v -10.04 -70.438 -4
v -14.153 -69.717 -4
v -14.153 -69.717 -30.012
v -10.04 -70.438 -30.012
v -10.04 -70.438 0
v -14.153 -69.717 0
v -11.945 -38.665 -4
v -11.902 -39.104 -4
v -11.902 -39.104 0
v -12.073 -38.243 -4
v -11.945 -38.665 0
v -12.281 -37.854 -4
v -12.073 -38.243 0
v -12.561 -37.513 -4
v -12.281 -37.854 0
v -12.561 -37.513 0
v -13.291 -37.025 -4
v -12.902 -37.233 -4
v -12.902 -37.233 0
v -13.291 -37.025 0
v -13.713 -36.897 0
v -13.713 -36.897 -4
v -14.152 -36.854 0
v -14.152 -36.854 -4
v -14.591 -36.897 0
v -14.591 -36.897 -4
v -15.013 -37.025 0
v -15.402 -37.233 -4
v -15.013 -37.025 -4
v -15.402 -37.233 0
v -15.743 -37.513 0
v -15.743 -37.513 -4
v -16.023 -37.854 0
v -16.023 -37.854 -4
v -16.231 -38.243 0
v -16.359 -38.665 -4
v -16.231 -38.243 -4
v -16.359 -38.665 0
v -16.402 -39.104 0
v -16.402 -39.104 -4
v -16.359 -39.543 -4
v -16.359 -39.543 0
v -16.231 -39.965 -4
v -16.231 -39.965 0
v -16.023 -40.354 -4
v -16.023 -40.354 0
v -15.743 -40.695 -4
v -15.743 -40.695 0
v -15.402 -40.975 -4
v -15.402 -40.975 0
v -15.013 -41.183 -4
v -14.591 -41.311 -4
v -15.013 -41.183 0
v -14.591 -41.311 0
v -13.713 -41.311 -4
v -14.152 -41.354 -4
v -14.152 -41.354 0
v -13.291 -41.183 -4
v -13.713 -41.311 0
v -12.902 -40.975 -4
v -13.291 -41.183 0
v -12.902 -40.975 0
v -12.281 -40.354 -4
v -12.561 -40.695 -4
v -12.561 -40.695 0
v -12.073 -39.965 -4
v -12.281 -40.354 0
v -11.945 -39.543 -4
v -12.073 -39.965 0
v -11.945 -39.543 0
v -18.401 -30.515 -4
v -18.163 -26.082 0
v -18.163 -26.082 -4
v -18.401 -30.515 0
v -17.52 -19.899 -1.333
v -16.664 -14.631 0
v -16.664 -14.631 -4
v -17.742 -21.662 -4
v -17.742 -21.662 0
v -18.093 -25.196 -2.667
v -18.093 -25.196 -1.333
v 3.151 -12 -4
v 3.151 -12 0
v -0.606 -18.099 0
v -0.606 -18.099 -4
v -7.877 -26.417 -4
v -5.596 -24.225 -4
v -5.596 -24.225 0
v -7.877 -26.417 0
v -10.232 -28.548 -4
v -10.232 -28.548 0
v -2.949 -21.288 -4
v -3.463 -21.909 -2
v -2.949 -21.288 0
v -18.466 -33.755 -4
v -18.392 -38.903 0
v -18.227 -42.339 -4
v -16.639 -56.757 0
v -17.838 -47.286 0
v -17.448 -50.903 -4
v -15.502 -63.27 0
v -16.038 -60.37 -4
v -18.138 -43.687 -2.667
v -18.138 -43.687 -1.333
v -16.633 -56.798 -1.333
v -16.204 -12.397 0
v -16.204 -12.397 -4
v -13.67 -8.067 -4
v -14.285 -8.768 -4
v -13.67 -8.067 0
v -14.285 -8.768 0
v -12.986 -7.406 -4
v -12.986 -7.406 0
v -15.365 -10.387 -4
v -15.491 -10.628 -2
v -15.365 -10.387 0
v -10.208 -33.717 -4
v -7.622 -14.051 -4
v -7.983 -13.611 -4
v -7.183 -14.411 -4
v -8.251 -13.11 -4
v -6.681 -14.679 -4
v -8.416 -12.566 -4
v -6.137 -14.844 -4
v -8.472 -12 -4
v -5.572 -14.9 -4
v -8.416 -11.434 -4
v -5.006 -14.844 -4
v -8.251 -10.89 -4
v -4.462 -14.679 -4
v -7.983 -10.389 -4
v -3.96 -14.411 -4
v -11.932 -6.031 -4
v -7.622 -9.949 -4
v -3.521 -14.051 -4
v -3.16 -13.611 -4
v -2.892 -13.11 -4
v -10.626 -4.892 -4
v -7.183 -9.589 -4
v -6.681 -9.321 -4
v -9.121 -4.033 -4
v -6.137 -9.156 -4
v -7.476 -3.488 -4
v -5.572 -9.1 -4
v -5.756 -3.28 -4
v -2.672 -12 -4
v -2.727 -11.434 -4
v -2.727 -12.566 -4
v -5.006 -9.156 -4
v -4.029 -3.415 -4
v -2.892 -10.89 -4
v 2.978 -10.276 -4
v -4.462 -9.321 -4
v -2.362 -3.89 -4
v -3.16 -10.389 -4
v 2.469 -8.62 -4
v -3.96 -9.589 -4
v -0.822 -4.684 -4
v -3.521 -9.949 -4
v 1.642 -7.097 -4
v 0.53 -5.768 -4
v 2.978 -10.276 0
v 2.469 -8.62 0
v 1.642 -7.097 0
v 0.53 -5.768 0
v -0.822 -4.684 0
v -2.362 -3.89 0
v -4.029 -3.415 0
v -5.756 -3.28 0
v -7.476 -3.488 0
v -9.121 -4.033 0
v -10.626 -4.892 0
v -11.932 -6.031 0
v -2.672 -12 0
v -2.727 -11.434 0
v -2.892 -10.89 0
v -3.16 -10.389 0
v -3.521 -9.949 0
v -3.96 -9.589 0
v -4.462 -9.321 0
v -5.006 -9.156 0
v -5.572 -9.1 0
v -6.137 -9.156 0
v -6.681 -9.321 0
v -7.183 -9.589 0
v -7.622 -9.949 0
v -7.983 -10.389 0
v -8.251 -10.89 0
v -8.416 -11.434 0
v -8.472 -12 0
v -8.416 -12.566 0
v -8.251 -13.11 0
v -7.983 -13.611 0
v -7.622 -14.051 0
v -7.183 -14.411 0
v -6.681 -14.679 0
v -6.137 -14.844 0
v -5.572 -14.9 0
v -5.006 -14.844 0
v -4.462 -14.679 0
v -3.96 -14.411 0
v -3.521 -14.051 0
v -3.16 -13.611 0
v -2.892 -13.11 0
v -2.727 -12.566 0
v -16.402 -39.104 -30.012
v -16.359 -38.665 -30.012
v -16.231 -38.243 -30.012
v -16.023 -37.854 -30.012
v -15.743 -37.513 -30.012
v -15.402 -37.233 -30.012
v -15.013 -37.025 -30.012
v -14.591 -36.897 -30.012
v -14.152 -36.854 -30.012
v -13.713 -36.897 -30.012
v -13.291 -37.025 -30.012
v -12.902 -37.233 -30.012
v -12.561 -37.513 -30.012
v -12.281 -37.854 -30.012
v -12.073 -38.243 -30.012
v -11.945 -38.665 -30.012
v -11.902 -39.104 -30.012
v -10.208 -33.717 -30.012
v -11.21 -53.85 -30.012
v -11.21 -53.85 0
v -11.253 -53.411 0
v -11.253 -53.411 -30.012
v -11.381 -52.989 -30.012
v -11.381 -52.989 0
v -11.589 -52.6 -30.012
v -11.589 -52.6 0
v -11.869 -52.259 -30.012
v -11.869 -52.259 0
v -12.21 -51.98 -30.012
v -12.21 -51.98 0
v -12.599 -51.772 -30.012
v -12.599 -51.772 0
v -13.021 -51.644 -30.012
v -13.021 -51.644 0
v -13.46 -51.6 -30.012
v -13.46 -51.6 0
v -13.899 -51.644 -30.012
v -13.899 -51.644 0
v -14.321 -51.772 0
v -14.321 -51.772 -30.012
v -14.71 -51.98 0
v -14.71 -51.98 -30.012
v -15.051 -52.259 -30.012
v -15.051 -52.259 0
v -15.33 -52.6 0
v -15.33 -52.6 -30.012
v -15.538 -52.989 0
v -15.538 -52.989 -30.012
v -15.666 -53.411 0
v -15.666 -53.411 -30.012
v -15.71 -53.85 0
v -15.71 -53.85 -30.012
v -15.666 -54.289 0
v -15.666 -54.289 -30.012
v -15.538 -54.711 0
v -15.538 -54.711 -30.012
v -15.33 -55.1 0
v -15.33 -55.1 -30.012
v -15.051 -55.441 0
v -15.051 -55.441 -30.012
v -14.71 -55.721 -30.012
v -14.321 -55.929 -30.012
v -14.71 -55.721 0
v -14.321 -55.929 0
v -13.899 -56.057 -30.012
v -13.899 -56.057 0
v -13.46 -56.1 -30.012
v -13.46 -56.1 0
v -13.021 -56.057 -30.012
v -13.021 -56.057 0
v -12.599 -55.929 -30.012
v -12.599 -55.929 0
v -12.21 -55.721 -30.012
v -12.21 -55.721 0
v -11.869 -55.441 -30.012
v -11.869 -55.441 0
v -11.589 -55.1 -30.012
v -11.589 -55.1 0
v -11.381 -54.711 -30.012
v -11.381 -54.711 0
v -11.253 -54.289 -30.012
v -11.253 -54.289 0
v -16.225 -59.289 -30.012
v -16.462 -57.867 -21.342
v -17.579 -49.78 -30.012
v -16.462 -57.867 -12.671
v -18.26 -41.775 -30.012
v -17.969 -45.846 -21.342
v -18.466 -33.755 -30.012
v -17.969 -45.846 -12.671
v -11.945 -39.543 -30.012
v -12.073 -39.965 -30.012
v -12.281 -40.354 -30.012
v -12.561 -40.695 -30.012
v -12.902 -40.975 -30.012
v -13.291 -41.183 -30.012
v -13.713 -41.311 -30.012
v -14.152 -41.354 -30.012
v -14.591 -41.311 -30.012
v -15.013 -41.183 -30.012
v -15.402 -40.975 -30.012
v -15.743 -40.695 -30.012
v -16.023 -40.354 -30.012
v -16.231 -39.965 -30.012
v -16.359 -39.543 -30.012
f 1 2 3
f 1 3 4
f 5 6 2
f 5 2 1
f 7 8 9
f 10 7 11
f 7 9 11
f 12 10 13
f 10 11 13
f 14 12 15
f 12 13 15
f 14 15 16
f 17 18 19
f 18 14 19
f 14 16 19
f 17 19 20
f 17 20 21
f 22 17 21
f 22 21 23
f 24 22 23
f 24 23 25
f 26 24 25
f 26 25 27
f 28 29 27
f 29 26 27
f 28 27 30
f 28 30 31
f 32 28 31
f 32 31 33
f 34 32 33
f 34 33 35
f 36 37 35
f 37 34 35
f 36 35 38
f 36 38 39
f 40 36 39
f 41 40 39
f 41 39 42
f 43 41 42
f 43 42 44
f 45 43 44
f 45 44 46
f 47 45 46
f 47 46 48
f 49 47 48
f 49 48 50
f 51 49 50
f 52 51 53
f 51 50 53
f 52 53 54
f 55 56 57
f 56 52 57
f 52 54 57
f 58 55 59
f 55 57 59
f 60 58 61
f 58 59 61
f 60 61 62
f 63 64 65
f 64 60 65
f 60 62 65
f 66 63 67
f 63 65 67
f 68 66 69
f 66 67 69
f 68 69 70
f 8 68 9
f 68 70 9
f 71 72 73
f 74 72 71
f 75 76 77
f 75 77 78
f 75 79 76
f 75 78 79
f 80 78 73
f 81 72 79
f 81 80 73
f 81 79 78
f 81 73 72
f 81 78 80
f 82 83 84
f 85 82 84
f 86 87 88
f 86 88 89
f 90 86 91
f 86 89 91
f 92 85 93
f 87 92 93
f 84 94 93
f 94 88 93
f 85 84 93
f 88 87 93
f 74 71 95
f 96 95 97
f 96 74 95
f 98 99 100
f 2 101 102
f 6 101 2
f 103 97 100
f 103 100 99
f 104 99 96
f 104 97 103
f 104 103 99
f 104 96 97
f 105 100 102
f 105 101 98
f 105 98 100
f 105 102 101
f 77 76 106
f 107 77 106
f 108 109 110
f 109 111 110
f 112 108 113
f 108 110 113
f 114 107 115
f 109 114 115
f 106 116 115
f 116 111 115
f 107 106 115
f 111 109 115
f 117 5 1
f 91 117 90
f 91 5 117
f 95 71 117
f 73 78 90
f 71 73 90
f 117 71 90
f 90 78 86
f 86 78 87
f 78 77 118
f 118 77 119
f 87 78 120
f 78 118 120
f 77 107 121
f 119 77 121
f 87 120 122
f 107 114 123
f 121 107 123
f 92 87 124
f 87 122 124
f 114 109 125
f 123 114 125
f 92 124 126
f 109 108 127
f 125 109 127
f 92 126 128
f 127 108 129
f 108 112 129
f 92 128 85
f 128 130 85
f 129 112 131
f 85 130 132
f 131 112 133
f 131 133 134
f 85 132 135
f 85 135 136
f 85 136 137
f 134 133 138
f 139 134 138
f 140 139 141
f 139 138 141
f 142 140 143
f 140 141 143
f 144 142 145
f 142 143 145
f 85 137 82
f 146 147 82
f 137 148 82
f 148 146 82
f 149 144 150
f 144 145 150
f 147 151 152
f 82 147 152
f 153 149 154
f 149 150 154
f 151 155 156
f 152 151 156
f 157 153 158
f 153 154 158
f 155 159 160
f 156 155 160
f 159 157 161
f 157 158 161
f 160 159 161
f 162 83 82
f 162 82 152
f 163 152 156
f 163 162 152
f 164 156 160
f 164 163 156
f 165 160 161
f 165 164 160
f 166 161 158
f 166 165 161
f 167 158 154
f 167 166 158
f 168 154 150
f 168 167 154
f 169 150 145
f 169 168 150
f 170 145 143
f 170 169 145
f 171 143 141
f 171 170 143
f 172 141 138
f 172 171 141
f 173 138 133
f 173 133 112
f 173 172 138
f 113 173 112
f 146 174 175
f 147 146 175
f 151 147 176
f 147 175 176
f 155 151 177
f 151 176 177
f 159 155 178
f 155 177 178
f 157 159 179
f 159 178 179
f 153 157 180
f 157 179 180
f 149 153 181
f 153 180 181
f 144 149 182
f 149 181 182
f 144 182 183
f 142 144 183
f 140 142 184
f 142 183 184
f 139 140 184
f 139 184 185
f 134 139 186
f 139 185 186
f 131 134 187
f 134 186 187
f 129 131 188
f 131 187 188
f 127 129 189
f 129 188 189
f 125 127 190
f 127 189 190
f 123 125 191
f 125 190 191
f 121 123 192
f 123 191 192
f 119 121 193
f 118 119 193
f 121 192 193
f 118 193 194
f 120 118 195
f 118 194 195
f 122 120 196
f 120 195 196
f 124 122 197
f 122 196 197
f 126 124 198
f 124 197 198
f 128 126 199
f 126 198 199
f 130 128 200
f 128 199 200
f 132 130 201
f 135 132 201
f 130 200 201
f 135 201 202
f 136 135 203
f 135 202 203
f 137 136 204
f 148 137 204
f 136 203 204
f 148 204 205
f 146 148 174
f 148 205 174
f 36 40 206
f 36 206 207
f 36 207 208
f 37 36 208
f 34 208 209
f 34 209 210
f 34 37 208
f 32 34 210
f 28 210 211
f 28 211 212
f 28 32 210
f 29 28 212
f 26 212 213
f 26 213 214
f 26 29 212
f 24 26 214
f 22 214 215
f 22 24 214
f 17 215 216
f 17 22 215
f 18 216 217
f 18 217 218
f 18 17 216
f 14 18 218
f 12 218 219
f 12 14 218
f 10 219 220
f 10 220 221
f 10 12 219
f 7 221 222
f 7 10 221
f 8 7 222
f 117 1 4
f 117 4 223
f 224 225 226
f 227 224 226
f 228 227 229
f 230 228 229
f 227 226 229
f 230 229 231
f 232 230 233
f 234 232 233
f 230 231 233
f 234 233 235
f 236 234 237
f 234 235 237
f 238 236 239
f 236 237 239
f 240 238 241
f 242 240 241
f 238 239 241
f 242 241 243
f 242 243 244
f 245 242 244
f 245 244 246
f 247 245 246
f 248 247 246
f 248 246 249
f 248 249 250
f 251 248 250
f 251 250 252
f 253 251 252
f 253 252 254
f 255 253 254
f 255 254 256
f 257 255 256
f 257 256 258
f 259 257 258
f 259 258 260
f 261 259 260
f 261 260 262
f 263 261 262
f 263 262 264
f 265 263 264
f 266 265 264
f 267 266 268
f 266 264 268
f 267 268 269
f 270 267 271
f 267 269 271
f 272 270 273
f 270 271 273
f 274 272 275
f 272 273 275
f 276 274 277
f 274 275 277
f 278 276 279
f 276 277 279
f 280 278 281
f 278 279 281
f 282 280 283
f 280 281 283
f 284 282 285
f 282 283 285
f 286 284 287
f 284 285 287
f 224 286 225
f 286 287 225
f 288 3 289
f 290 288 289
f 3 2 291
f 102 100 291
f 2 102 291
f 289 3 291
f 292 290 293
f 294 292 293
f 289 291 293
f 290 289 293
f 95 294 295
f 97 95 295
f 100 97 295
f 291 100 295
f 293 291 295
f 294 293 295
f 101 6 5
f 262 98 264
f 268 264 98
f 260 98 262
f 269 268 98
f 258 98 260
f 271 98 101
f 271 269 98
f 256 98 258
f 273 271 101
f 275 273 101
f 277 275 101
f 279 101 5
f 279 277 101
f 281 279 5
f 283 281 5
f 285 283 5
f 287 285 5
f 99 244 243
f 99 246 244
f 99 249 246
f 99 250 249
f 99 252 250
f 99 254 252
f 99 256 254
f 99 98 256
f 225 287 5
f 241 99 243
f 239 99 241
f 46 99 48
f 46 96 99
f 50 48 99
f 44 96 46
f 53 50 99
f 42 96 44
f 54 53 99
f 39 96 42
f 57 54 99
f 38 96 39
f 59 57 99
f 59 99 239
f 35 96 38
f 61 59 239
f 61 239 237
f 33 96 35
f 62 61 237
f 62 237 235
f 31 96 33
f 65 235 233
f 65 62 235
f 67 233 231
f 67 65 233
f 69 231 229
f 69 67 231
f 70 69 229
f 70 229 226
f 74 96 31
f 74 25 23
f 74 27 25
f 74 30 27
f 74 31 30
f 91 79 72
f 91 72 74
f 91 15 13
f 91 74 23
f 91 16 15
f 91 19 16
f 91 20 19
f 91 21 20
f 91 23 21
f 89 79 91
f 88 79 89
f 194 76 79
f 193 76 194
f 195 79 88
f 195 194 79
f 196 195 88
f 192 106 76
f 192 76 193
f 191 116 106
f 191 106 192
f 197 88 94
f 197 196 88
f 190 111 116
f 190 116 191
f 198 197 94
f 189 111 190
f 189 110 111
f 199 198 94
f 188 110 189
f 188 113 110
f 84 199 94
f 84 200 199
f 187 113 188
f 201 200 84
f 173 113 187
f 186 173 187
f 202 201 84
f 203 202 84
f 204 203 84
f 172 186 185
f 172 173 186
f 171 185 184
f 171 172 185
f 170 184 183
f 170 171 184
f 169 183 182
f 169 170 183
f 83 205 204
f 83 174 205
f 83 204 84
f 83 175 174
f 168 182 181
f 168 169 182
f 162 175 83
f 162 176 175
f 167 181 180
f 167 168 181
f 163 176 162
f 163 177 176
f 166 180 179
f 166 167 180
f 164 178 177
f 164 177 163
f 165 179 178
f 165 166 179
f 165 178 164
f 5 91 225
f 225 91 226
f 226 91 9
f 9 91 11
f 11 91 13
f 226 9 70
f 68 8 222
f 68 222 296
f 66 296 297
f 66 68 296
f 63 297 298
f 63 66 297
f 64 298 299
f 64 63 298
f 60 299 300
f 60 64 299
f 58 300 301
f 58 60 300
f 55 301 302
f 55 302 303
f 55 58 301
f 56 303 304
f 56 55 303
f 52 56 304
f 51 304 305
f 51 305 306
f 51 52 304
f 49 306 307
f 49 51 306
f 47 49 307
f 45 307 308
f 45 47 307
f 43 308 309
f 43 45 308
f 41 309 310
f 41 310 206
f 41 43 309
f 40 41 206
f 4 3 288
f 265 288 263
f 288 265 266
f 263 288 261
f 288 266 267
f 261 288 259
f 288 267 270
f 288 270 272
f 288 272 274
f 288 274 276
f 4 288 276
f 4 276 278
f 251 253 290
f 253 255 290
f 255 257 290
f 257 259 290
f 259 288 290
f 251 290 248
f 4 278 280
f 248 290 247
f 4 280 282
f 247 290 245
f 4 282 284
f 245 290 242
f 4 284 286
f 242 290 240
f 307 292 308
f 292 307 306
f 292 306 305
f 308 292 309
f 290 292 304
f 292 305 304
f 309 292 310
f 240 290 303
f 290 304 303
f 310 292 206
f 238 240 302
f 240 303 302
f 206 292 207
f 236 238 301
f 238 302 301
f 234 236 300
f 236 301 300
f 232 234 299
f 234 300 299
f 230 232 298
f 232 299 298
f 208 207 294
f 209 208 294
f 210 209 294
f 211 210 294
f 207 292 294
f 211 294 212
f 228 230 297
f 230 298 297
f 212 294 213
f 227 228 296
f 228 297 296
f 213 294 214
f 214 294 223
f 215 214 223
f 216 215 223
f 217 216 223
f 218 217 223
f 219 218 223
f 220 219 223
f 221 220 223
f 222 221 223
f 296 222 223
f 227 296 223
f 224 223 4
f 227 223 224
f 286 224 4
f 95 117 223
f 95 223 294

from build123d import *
from build123d.topology import SkipClean

# Parameters (mm, degrees)
SKETCH1_R           = 2.9
BOSS_EXTRUDE1_DEPTH = 4
SKETCH2_R           = 2.25
BOSS_EXTRUDE2_DEPTH = 26.012432
SKETCH3_R           = 2.25
CUT_EXTRUDE1_DEPTH  = 79.761768867


with BuildPart() as part:
    # Sketch1 → Boss-Extrude1 (new body)
    with BuildSketch(Plane.XY):
        with BuildLine():
            Line((-14.153385189, -69.716871134), (-10.039841479, -70.438427685))
            Line((-10.039841479, -70.438427685), (-10.231600818, -28.548135162))
            add(Edge.make_bspline(
                [(3.150526507, -12), (1.121426745, -15.448537633), (-2.522354698, -21.641292501), (-7.864373324, -26.42729642), (-10.231600818, -28.548135162)],
                knots=[0, 0, 0, 0, 0.556866484, 1, 1, 1, 1], degree=3))
            ThreePointArc((3.150526507, -12), (-3.18362895, -3.611112101), (-12.986183722, -7.406488955))
            add(Edge.make_bspline(
                [(-16.663916234, -14.630806425), (-16.157795835, -10.23676377), (-12.986183722, -7.406488955)],
                knots=[0, 0, 0, 1, 1, 1], degree=2))
            add(Edge.make_bspline(
                [(-16.663916234, -14.630806425), (-17.667702323, -19.881251045), (-18.220131563, -25.189037493), (-18.401311599, -30.514562532)],
                knots=[0, 0, 0, 0, 0.288118642, 0.288118642, 0.288118642, 0.288118642], degree=3))
            add(Edge.make_bspline(
                [(-18.401311599, -30.514562532), (-18.848969857, -43.672829442), (-17.03022033, -56.93938717), (-14.153385189, -69.716871134)],
                knots=[0.288118642, 0.288118642, 0.288118642, 0.288118642, 1, 1, 1, 1], degree=3))
        make_face()
        with Locations((-5.571628032, -12)):
            Circle(SKETCH1_R, mode=Mode.SUBTRACT)
    extrude(amount=-BOSS_EXTRUDE1_DEPTH)

    # Sketch2 → Boss-Extrude2 (add)
    with BuildSketch(Plane(origin=(0, 0, -4), x_dir=(-1, 0, 0), z_dir=(0, 0, -1))):
        with BuildLine():
            Line((10.207939206, -33.717071631), (18.466393507, -33.754875992))
            add(Edge.make_bspline(
                [(14.153385189, -69.716871134), (16.794208846, -57.987633874), (18.543433317, -45.846277061), (18.466393507, -33.754875992)],
                knots=[0.288118642, 0.288118642, 0.288118642, 0.288118642, 0.941598261, 0.941598261, 0.941598261, 0.941598261], degree=3))
            Line((14.153385189, -69.716871134), (10.039841479, -70.438427685))
            Line((10.039841479, -70.438427685), (10.207939206, -33.717071631))
        make_face()
        with Locations((14.152153946, -39.103816176)):
            Circle(SKETCH2_R, mode=Mode.SUBTRACT)
    extrude(amount=BOSS_EXTRUDE2_DEPTH)

    # Sketch3 → Cut-Extrude1 (cut, through all)
    with SkipClean():  # the faces are left unmerged after this step: merging them gives an invalid solid
        with BuildSketch(Plane.XY):
            with Locations((-13.459661862, -53.850312066)):
                Circle(SKETCH3_R)
            with Locations((-14.152153946, -39.103816176)):
                Circle(SKETCH3_R)
        extrude(amount=-CUT_EXTRUDE1_DEPTH, mode=Mode.SUBTRACT)


solid = part.part
